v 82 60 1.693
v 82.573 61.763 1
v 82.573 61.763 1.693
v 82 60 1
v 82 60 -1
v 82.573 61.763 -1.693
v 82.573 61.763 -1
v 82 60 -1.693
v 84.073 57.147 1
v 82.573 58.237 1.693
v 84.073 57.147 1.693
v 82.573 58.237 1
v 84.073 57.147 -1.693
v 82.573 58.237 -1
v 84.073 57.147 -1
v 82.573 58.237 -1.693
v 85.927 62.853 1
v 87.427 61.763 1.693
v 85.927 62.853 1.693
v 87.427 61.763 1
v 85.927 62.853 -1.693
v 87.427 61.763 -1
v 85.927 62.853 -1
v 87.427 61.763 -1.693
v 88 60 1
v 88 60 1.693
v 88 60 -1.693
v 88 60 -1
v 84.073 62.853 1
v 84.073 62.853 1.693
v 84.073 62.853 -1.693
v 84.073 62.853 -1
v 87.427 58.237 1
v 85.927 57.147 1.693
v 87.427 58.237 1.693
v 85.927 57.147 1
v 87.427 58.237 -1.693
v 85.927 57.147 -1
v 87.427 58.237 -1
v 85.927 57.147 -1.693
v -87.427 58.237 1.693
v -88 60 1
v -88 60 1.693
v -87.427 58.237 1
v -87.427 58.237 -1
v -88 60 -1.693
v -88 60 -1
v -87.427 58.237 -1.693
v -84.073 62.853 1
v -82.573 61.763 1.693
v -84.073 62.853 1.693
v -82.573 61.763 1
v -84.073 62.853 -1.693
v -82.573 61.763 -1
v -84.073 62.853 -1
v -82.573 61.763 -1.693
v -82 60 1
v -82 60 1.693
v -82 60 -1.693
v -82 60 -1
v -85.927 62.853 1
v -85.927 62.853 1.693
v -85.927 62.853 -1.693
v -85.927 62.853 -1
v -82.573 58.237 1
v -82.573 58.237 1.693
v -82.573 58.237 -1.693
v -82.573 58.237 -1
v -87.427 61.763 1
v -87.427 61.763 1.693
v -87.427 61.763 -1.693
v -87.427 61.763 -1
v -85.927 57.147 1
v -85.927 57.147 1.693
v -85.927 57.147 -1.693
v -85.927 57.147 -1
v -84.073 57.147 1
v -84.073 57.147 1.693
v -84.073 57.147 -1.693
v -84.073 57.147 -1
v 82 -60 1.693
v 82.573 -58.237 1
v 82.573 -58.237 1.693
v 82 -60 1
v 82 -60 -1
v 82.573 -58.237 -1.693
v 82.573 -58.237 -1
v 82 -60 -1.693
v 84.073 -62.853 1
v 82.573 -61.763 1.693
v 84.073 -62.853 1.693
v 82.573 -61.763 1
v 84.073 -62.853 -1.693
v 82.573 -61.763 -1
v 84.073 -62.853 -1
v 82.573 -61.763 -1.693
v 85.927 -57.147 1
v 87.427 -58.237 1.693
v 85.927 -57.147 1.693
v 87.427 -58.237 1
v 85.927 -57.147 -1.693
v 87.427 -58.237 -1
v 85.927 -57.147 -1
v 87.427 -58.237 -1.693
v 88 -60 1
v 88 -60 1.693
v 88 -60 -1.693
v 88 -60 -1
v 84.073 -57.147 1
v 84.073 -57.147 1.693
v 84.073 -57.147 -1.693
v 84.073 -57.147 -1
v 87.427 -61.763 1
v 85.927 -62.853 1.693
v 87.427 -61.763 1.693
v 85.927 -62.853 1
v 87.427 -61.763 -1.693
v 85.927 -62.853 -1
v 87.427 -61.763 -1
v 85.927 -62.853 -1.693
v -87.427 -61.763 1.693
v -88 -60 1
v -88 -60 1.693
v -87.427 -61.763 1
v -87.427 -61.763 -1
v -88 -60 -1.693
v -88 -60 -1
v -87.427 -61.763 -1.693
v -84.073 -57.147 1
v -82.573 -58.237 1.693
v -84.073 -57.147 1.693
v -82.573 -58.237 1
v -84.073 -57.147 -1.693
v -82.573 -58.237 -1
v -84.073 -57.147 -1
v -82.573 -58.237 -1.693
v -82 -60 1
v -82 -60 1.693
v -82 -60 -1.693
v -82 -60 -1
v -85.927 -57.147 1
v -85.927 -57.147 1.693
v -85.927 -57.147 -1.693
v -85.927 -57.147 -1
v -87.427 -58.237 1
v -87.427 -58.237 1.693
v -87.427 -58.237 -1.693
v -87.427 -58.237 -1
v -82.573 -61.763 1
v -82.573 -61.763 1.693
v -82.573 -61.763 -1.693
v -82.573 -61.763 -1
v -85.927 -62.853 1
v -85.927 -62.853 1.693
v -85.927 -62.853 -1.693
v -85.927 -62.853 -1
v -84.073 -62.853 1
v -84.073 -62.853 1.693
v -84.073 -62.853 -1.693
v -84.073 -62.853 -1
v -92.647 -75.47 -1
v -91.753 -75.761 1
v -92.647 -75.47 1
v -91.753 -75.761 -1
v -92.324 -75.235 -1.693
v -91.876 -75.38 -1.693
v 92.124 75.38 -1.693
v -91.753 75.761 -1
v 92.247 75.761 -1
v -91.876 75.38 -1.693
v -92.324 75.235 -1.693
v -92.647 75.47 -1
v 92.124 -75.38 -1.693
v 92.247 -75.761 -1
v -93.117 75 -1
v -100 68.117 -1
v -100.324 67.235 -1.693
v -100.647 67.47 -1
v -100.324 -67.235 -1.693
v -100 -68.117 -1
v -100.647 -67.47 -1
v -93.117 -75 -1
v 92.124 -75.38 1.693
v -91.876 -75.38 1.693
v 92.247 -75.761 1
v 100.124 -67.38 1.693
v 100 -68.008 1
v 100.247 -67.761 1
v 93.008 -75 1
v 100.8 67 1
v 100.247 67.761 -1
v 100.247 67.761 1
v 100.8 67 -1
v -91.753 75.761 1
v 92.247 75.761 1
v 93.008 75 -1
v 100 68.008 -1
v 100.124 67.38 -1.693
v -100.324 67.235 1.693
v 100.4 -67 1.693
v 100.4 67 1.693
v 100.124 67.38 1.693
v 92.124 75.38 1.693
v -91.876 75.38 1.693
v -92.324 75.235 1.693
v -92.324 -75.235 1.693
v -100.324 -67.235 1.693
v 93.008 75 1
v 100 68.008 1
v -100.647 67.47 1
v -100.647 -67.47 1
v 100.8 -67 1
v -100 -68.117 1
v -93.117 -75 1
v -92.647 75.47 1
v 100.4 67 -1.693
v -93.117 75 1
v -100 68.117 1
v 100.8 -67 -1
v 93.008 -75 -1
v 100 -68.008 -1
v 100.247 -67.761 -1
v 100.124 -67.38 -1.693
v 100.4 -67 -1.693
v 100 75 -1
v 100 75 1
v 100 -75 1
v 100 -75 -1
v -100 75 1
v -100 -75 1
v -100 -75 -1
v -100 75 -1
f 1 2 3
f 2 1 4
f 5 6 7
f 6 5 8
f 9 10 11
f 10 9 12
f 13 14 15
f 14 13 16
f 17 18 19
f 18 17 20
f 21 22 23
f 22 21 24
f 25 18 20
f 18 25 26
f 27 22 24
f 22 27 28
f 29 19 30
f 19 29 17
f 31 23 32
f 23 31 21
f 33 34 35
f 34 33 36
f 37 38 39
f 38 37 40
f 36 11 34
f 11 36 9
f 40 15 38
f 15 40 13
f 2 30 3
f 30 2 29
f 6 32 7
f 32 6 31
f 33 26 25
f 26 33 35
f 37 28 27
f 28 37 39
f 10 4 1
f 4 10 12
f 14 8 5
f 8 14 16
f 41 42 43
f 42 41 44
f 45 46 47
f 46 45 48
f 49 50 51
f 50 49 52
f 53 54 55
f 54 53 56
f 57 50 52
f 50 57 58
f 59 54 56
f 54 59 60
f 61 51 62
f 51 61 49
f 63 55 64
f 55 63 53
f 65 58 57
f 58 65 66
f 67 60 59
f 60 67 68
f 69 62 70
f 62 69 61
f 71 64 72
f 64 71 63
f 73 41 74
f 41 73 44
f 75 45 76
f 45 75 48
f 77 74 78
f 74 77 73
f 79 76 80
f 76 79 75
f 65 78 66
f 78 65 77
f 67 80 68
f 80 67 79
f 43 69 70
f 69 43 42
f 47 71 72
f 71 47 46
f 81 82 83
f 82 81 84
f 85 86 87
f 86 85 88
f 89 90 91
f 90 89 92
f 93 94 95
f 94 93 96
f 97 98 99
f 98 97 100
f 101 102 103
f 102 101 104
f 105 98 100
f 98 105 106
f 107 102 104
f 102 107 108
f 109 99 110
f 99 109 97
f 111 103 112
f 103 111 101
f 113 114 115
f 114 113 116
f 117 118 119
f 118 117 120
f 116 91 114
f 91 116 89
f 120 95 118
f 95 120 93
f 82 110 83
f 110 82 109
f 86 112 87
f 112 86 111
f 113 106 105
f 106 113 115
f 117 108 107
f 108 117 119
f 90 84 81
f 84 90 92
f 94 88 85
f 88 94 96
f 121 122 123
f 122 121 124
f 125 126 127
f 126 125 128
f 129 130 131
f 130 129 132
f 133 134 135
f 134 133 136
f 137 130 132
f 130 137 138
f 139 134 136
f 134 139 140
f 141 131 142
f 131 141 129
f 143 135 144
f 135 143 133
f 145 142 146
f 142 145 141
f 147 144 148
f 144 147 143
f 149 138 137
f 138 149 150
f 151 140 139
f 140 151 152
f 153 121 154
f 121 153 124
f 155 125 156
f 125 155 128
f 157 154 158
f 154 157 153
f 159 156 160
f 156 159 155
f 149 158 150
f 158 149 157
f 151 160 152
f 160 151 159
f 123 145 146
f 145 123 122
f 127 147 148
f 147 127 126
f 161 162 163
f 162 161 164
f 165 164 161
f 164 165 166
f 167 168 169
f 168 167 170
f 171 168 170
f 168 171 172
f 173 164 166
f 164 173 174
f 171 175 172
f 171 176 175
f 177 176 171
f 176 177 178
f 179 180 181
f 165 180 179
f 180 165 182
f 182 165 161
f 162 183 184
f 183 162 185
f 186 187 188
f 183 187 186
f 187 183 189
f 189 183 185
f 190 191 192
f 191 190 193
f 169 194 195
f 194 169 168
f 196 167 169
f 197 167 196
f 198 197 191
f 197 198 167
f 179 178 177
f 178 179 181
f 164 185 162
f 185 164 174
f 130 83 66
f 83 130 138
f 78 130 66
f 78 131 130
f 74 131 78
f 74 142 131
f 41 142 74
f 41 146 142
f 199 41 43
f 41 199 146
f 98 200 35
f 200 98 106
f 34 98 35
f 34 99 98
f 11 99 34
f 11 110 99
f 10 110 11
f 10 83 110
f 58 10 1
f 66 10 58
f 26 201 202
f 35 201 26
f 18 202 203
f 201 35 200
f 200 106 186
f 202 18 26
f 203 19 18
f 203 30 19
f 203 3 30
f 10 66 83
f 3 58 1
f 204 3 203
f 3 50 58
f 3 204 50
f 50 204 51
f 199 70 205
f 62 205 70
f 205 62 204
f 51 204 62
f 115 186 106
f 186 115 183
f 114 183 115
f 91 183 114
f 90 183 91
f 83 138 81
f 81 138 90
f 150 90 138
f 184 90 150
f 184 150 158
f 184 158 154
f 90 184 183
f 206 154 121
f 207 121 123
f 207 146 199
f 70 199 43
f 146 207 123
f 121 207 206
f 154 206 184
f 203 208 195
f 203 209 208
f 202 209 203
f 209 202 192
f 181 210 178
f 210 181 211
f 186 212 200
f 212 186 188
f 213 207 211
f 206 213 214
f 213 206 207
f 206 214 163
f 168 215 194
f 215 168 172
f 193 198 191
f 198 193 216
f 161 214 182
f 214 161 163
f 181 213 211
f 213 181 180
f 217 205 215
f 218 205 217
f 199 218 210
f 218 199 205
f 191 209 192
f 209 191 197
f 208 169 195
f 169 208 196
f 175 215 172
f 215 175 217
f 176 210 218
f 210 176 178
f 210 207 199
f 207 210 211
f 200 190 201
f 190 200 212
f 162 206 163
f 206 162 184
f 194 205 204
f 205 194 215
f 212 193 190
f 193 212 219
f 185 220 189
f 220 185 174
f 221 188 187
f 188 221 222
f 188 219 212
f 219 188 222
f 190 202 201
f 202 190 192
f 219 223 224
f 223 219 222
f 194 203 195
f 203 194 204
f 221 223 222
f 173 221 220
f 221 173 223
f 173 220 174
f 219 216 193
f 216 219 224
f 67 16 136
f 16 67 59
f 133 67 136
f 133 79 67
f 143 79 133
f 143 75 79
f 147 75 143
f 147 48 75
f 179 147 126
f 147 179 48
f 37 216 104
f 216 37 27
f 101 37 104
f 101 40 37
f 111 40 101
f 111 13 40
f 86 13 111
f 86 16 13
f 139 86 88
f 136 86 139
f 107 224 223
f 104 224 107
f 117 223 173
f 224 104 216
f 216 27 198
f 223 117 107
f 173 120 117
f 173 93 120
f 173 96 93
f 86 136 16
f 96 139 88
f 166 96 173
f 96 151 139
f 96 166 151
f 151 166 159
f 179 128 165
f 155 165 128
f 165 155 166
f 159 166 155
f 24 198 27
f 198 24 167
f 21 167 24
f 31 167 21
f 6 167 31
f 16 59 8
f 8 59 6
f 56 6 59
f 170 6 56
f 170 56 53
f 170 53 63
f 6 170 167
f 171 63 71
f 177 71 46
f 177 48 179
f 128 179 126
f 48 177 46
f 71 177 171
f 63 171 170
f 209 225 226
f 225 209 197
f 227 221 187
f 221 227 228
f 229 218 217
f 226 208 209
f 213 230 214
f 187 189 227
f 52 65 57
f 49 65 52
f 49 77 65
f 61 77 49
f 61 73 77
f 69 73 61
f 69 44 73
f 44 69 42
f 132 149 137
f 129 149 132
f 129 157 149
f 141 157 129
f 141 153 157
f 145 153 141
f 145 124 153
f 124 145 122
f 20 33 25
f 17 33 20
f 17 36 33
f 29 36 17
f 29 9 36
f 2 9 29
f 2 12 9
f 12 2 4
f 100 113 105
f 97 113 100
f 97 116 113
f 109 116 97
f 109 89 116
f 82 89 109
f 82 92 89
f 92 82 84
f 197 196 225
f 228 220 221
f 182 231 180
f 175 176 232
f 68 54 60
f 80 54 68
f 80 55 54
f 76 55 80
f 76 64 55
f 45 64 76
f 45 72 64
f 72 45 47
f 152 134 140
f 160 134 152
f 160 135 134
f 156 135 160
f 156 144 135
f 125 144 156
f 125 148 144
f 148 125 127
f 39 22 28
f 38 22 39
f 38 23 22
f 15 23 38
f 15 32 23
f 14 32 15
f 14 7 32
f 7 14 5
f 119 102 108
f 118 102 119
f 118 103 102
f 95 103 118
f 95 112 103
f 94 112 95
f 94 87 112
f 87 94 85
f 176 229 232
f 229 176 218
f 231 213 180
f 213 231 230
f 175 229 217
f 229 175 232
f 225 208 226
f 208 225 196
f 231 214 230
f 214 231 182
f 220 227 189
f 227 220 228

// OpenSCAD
// Parameters
sheet_L = 200; //[100:400:1]
sheet_W = 150; //[75:300:1]
sheet_T = 2; //[1:6:0.5]
corner_R = 8; //[4:16:1]
hole_D = 6; //[3:12:0.5]
hole_edge_margin = 15; //[8:30:1]
chamfer_size = 0.8; //[0.2:2:0.1]
overlap = 1; //[0.5:2:0.5]

// Base shapes
module sheet_body() {
  color("Silver")
  cube([sheet_L, sheet_W, sheet_T], center=true);
}

module rounded_corners() {
  color("Silver")
  linear_extrude(height=sheet_T, center=true) {
    polygon(points=[
      [-sheet_L/2 + corner_R, -sheet_W/2],
      [sheet_L/2 - corner_R, -sheet_W/2],
      [sheet_L/2, -sheet_W/2 + corner_R],
      [sheet_L/2, sheet_W/2 - corner_R],
      [sheet_L/2 - corner_R, sheet_W/2],
      [-sheet_L/2 + corner_R, sheet_W/2],
      [-sheet_L/2, sheet_W/2 - corner_R],
      [-sheet_L/2, -sheet_W/2 + corner_R]
    ]);
  }
}

module mounting_holes() {
  color("Black")
  cylinder(r=hole_D/2, h=sheet_T + 2*overlap, center=true);
}

module chamfer_edges() {
  sphere(r=chamfer_size, center=true);
}

// Operations
module mounting_holes_all() {
  union() {
    translate([sheet_L/2 - hole_edge_margin, sheet_W/2 - hole_edge_margin, 0]) mounting_holes();
    translate([-(sheet_L/2 - hole_edge_margin), sheet_W/2 - hole_edge_margin, 0]) mounting_holes();
    translate([sheet_L/2 - hole_edge_margin, -(sheet_W/2 - hole_edge_margin), 0]) mounting_holes();
    translate([-(sheet_L/2 - hole_edge_margin), -(sheet_W/2 - hole_edge_margin), 0]) mounting_holes();
  }
}

module sheet_rounded_base() {
  minkowski() {
    rounded_corners();
    chamfer_edges();
  }
}

module sheet_with_holes() {
  difference() {
    sheet_rounded_base();
    mounting_holes_all();
  }
}

module final_sheet() {
  union() {
    sheet_with_holes();
    sheet_body();
  }
}

// Final output
final_sheet();
